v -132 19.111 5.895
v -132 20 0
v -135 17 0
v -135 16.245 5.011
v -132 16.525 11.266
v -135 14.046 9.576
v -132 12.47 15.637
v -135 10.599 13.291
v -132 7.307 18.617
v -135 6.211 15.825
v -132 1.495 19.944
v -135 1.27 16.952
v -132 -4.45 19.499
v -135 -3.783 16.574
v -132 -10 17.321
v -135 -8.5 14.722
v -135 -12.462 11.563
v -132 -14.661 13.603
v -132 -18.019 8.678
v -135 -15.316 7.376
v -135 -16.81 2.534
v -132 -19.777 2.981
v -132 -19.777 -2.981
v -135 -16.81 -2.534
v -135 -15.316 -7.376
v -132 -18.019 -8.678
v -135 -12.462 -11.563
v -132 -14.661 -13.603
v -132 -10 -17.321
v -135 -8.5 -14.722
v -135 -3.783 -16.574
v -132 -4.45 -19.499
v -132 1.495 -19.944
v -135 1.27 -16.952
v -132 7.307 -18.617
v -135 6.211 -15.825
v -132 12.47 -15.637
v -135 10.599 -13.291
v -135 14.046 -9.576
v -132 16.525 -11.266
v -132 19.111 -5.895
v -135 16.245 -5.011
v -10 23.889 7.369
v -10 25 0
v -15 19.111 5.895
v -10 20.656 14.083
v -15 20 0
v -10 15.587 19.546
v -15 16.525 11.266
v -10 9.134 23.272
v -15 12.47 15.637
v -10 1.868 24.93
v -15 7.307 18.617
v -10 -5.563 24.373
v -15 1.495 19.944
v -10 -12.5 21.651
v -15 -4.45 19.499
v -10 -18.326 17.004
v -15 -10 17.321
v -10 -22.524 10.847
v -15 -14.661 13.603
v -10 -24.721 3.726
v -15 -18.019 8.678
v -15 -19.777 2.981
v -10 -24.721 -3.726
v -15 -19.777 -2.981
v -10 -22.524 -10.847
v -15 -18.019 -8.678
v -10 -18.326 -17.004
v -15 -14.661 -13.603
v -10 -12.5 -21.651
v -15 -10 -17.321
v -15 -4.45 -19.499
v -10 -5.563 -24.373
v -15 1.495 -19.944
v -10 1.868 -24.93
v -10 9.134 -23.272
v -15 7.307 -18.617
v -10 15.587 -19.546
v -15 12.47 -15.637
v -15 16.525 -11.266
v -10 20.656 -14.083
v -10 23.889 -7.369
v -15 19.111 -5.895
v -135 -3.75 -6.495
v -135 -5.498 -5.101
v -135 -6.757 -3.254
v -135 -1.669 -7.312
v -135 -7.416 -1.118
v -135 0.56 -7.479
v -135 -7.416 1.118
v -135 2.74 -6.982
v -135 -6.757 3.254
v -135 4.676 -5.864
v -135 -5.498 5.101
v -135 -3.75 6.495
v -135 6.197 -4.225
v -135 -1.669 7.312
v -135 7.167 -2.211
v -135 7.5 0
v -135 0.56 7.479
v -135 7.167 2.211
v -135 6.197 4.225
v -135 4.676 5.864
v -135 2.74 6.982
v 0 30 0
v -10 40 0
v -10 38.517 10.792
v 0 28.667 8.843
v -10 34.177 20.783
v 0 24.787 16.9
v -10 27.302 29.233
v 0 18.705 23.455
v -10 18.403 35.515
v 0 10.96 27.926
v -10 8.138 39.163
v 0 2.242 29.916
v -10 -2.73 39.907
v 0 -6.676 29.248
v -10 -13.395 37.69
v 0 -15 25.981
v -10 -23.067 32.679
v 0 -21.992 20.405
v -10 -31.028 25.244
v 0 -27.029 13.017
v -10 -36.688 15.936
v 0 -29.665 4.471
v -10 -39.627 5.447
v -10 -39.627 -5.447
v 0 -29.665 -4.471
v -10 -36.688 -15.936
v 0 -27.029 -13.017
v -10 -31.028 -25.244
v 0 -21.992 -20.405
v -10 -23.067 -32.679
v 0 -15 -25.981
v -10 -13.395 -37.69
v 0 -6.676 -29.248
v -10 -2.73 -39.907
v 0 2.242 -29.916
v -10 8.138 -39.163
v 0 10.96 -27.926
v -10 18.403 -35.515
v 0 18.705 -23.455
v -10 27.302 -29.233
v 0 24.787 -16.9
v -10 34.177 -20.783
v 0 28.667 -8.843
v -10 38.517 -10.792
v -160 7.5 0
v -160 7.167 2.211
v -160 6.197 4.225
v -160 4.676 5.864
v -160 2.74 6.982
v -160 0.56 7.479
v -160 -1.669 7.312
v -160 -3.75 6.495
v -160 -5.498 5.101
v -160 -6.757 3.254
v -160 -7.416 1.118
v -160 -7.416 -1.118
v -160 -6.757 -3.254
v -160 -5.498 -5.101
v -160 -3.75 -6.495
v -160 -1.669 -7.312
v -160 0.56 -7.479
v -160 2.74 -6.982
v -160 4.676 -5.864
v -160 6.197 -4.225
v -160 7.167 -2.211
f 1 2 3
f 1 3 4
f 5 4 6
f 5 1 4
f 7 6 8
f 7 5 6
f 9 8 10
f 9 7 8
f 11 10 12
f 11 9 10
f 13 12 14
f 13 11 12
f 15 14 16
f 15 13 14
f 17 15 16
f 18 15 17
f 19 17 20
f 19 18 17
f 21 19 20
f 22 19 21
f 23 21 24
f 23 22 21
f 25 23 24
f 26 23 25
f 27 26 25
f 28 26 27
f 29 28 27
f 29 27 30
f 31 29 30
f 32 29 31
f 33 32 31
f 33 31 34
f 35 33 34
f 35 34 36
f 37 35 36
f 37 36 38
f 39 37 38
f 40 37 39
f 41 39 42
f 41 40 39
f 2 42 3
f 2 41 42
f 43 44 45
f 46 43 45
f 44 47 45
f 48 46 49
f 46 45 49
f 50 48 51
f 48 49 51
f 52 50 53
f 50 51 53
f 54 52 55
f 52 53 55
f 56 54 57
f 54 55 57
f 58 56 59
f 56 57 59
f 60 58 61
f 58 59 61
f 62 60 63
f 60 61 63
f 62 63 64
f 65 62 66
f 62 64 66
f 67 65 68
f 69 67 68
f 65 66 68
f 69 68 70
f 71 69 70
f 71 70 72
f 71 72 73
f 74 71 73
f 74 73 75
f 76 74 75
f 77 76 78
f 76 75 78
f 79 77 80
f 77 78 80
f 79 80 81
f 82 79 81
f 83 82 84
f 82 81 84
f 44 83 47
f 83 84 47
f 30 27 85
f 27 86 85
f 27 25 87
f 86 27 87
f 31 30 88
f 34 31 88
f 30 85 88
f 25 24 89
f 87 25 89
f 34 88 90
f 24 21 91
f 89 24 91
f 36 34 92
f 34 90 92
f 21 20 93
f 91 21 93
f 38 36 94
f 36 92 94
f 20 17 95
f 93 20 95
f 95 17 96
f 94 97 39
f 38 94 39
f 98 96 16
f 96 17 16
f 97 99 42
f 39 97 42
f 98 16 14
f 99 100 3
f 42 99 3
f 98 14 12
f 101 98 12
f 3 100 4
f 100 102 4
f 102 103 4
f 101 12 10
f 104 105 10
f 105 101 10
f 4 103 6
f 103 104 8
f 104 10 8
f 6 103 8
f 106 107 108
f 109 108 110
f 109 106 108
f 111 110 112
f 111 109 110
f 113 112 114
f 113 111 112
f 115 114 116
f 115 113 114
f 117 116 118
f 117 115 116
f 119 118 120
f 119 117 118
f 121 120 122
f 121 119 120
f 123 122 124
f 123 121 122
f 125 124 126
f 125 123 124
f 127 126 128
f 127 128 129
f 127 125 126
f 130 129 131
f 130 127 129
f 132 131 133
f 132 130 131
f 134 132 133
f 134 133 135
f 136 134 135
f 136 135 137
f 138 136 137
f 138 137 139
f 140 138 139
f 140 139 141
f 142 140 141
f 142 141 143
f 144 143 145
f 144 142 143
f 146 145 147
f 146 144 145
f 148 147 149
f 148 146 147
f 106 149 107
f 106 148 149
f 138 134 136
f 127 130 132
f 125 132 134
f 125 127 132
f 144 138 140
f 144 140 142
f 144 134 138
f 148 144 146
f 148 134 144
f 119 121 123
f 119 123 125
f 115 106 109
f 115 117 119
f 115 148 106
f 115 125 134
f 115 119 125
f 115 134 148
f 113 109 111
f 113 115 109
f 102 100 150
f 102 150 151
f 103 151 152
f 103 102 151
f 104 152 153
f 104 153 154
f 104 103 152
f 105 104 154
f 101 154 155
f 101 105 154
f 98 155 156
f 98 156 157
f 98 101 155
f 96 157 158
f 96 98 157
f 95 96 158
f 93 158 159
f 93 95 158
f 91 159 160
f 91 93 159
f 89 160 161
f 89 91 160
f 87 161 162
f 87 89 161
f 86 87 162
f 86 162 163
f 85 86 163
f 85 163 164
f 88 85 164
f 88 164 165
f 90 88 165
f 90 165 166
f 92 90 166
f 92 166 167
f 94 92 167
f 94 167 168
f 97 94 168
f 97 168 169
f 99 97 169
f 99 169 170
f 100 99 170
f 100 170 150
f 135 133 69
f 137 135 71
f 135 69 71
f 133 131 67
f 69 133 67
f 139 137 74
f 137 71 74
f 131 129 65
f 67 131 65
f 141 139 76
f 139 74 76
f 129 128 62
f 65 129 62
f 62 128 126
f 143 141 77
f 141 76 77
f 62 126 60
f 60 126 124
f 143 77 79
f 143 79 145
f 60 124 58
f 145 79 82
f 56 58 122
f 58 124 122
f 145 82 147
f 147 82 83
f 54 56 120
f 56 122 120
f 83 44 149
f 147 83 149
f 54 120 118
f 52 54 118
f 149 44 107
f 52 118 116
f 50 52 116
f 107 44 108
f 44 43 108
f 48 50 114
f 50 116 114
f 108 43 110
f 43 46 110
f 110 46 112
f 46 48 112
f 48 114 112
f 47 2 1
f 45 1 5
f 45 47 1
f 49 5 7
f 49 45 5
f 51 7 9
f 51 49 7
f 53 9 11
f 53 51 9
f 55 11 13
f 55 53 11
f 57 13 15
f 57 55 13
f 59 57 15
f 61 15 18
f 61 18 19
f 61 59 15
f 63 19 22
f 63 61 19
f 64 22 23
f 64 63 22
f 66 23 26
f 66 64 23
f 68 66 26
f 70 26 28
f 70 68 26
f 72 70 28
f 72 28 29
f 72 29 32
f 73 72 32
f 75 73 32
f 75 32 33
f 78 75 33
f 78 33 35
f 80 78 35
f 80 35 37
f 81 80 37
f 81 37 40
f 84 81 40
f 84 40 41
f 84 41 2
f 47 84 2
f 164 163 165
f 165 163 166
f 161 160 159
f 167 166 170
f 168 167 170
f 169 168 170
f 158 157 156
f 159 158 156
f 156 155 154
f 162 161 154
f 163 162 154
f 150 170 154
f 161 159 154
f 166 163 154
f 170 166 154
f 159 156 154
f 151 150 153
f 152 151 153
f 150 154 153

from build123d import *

# Parameters (mm, degrees)
F0_R        = 40
F0_R_2      = 25
F1_DEPTH    = 10
F0_R_3      = 20
F2_DEPTH    = 20
F0_R_4      = 7.5
F3_DEPTH    = 135
F4_DEPTH    = 160
F5_S8_R     = 20
F5_T9_DEPTH = 37
F6_SIZE2    = 3
F6_SIZE     = 3


# Not quite as in the source:
# - a fillet or chamfer that OpenCascade refuses, or shapes differently, is made with other operations: its cross-section is extruded or revolved along the edge and cut away or added


with BuildPart() as f1:
    # F0 (on Right) → F1 (new body)
    with BuildSketch(Plane.YZ):
        Circle(F0_R)
        Circle(F0_R_2, mode=Mode.SUBTRACT)
    extrude(amount=-F1_DEPTH)

    # F0 (on Right) → F2 (join)
    with BuildSketch(Plane.YZ):
        Circle(F0_R_2)
        Circle(F0_R_3, mode=Mode.SUBTRACT)
    extrude(amount=-F2_DEPTH)

    # F0 (on Right) → F3 (join)
    with BuildSketch(Plane.YZ):
        Circle(F0_R_3)
        Circle(F0_R_4, mode=Mode.SUBTRACT)
    extrude(amount=-F3_DEPTH)

    # F0 (on Right) → F4 (join)
    with BuildSketch(Plane.YZ):
        Circle(F0_R_4)
    extrude(amount=-F4_DEPTH)

    # F5: chamfer of 10 on 2 edges, made by hand

    # F5_s1 → F5_t2 (revolve, cut)
    with BuildSketch(Plane.XY):
        Polygon((-10, 40), (0, 30), (0, 40), align=None)
    revolve(axis=Axis((0, 0, 0), (1, 0, 0)), mode=Mode.SUBTRACT)


with BuildPart() as f5_tool4:
    # F5_s5 → F5_t6 (revolve)
    with BuildSketch(Plane.XY):
        Polygon((-10, 25), (-20, 15), (-20, 25), align=None)
    revolve(axis=Axis((-20, 0, 0), (1, 0, 0)))

    split(bisect_by=Plane.YZ.offset(-10), keep=Keep.BOTTOM)

    # F5_s8 → F5_t9 (cut, symmetric)
    with BuildSketch(Plane.YZ.offset(-15)):
        Circle(F5_S8_R)
    extrude(amount=F5_T9_DEPTH, both=True, mode=Mode.SUBTRACT)


with BuildPart() as f1_1:
    add(f1.part)

    # F5_t3: cut F5_tool4
    add(f5_tool4.part, mode=Mode.SUBTRACT)

    # F6
    f6_edges = [f1_1.edges().sort_by_distance(p)[0] for p in [
        (-135, -20, 0),
    ]]
    chamfer(f6_edges, length=F6_SIZE, length2=F6_SIZE2)


solid = f1_1.part
